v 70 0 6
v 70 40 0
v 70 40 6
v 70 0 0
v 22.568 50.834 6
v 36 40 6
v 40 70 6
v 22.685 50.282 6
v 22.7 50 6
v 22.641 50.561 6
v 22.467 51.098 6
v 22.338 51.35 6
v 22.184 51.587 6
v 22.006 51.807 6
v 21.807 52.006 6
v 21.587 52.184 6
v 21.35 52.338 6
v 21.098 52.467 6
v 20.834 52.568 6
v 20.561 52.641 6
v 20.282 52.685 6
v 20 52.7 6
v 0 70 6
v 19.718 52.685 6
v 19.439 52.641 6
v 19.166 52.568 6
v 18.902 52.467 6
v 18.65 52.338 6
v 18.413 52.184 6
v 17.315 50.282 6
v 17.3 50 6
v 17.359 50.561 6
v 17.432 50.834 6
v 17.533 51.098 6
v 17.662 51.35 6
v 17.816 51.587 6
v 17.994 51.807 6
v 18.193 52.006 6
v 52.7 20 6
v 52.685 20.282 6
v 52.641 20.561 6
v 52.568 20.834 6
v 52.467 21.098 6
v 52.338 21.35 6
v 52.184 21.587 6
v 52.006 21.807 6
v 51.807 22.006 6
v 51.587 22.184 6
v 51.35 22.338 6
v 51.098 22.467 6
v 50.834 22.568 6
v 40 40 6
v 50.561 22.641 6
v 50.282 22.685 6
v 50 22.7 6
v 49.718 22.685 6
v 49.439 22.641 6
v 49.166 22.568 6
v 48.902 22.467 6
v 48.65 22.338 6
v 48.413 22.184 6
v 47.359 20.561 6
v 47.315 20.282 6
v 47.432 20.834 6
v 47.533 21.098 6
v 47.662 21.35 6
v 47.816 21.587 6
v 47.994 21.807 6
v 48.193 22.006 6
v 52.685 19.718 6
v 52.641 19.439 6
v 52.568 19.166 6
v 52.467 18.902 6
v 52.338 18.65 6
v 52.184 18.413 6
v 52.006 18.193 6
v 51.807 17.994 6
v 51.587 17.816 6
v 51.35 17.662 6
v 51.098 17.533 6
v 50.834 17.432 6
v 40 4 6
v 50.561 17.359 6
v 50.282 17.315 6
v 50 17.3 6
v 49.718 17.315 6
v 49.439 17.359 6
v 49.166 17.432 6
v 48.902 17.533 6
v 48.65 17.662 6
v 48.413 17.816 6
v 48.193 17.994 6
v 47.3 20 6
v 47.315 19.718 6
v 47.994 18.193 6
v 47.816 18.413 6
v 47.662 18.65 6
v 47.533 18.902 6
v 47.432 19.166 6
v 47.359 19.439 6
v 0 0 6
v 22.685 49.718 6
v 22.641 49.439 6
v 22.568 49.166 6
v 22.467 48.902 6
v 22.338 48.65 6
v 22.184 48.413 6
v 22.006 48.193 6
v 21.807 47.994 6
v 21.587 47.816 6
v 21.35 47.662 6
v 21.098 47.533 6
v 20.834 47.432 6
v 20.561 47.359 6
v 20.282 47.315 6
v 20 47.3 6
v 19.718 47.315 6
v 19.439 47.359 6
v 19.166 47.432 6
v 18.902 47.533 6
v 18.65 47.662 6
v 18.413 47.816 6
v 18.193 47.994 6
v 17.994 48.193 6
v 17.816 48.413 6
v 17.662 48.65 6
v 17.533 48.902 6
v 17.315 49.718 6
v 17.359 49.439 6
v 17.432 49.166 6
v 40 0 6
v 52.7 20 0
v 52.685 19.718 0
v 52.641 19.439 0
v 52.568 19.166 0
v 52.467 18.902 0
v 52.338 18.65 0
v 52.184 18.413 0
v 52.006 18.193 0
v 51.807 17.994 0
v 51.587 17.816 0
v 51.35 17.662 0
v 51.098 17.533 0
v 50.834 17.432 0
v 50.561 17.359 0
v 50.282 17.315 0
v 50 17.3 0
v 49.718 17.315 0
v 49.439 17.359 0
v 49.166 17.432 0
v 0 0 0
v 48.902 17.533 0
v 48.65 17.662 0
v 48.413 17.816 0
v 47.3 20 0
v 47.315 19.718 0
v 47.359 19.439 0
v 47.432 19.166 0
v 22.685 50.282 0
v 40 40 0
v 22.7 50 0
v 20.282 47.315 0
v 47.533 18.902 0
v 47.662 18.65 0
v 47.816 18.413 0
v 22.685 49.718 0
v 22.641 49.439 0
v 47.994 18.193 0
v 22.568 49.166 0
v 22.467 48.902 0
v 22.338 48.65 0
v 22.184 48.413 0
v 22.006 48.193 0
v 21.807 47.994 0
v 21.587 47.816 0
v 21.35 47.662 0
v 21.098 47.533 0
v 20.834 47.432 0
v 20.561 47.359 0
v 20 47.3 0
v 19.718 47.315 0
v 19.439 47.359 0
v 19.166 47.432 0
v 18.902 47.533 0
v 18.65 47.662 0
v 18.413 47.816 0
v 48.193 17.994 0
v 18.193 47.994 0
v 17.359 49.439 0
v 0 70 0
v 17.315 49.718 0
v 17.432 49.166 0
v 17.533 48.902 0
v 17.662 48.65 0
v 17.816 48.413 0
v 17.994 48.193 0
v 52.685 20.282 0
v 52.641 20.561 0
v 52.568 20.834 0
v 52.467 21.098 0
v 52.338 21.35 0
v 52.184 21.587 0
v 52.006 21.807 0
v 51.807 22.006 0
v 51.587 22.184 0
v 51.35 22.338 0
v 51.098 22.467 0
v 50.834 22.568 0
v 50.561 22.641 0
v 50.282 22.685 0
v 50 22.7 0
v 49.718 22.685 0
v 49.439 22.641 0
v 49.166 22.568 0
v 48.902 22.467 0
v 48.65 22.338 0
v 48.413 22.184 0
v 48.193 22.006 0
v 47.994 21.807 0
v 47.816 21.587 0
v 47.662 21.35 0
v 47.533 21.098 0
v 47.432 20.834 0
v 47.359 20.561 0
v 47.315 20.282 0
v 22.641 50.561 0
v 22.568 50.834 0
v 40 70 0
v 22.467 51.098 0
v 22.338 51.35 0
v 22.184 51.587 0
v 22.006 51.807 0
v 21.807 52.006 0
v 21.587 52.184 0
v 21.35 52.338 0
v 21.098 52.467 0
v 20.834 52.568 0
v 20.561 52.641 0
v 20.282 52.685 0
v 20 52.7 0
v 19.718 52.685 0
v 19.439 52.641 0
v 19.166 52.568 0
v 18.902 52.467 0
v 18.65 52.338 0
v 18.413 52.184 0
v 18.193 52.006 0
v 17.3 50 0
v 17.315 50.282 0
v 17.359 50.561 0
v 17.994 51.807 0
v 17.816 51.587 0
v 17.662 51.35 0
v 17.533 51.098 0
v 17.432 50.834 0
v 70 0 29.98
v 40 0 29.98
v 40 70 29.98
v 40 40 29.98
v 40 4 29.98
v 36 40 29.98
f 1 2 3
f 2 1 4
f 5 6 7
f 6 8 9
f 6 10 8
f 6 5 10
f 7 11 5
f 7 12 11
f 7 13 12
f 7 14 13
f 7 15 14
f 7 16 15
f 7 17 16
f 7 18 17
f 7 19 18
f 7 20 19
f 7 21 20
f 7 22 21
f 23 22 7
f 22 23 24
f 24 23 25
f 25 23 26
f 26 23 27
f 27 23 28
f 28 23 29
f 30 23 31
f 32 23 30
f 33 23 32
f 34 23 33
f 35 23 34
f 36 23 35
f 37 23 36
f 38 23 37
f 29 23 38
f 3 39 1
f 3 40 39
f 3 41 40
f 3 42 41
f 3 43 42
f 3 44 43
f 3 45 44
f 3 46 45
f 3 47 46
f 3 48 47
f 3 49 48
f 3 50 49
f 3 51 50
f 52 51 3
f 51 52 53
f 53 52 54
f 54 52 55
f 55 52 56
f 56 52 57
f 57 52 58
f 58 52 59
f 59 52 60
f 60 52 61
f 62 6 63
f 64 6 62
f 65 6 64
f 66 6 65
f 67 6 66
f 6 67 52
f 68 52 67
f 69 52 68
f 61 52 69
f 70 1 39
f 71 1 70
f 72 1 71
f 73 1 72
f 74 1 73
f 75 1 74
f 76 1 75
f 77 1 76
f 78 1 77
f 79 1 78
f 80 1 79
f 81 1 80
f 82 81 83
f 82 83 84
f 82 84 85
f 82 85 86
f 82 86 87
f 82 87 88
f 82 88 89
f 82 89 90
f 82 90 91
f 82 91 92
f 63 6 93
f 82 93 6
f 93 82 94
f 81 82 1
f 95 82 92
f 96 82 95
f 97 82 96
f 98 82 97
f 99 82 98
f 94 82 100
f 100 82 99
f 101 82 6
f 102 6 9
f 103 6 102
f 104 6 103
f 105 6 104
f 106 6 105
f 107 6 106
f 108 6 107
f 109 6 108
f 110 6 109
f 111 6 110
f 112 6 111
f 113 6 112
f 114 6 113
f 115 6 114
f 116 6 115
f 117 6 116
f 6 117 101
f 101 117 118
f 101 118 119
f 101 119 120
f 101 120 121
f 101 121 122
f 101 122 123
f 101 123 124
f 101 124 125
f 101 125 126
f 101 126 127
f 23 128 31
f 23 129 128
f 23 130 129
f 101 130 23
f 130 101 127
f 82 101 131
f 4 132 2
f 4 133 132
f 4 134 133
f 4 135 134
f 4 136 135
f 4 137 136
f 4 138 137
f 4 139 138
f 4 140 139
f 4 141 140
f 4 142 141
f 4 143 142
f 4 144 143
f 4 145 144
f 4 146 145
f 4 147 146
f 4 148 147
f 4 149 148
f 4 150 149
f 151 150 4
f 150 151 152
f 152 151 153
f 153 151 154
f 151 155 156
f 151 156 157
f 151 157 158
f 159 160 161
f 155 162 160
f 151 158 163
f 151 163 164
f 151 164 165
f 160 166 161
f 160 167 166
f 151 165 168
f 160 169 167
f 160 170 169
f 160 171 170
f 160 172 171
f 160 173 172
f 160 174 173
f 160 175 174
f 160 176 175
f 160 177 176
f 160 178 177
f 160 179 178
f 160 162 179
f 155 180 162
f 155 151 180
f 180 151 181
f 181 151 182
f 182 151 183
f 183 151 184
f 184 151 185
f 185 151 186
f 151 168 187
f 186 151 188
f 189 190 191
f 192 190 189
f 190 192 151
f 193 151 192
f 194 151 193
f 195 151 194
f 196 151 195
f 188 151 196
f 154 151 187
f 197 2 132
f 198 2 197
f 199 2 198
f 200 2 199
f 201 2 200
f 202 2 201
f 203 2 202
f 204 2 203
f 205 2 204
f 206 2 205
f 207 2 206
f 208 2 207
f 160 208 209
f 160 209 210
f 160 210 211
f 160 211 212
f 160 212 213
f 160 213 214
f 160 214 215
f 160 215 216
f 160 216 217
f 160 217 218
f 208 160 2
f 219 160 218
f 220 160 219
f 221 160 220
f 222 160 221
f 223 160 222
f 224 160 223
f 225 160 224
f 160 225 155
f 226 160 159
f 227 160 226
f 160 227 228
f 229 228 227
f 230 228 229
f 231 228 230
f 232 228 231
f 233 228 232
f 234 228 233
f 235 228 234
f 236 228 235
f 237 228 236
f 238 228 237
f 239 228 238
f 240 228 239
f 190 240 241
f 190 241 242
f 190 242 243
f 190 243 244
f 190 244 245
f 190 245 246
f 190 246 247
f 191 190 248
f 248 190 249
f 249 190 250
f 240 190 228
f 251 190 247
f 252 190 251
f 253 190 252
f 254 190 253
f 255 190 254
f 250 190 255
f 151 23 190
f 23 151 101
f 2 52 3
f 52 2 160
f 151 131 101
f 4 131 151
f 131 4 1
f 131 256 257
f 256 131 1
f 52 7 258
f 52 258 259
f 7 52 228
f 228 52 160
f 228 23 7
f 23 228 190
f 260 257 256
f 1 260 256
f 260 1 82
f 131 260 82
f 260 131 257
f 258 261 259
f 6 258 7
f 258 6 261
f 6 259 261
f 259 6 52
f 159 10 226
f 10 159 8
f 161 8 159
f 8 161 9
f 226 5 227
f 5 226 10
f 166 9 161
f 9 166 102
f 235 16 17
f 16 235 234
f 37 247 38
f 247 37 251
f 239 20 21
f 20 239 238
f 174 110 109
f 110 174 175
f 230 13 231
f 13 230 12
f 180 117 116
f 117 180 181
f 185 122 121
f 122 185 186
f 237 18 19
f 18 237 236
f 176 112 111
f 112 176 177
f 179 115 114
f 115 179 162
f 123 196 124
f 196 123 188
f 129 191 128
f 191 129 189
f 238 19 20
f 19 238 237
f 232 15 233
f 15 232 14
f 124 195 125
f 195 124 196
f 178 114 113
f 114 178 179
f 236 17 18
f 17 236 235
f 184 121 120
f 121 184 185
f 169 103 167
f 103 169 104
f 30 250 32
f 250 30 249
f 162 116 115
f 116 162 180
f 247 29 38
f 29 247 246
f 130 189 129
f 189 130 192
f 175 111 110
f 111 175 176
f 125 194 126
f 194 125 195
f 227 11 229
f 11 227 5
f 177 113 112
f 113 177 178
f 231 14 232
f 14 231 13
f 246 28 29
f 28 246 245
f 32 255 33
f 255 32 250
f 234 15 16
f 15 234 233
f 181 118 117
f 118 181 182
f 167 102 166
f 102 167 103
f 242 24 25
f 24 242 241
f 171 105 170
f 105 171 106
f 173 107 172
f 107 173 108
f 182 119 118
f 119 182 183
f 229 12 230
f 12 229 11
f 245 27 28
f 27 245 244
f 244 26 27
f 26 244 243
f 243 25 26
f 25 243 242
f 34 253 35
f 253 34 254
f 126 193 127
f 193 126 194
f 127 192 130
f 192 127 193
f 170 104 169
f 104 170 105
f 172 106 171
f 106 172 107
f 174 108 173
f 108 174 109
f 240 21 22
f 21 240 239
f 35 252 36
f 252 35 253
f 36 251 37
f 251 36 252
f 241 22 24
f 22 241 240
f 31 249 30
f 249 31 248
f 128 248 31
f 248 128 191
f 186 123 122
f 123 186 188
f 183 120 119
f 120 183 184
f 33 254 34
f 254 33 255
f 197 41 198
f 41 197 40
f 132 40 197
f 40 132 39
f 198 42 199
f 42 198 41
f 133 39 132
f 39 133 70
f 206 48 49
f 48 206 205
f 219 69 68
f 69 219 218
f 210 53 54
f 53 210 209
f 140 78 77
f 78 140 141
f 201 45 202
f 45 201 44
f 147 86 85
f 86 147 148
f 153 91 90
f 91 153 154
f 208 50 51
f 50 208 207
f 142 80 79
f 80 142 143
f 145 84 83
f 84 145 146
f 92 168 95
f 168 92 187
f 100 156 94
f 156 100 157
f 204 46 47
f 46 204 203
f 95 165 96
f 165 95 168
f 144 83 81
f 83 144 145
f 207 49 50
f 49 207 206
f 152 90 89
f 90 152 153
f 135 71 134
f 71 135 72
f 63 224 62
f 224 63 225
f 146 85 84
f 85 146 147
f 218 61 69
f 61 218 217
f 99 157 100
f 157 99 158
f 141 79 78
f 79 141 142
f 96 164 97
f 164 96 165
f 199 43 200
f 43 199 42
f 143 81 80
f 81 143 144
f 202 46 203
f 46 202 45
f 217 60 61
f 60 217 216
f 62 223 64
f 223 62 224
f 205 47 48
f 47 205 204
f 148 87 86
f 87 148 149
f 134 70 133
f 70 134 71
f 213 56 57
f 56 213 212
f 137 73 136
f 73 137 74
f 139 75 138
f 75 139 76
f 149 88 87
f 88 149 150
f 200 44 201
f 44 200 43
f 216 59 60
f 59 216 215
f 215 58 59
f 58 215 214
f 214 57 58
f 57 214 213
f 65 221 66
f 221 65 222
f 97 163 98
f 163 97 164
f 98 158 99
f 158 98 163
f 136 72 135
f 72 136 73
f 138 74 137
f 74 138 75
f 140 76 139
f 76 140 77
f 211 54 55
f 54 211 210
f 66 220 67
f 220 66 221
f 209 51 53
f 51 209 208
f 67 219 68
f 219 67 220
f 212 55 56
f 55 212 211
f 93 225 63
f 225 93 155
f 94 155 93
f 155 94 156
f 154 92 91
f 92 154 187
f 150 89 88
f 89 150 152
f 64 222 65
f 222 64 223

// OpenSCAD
// 2040 reinforced gusset: reinforced right-angle profile gusset.
$fn = 60;
eps = 0.02;
profile = 40;
arm = 70;
plate_t = 6;
rib_t = 4;
rib_h = 24;
hole_d = 5.4;

module x_rib() {
    translate([profile, 0, plate_t - eps])
        linear_extrude(height = rib_h)
            polygon(points = [[0, 0], [arm - profile, 0], [0, rib_t]]);
}
module y_rib() {
    translate([profile, profile, plate_t - eps]) rotate([0, 0, 90])
        linear_extrude(height = rib_h)
            polygon(points = [[0, 0], [arm - profile, 0], [0, rib_t]]);
}

difference() {
    union() {
        cube([arm, profile, plate_t]);
        cube([profile, arm, plate_t]);
        x_rib();
        y_rib();
    }
    for (p = [[profile / 2, arm - profile / 2], [arm - profile / 2, profile / 2]])
        translate([p[0], p[1], -eps]) cylinder(d = hole_d, h = plate_t + 2 * eps);
}
